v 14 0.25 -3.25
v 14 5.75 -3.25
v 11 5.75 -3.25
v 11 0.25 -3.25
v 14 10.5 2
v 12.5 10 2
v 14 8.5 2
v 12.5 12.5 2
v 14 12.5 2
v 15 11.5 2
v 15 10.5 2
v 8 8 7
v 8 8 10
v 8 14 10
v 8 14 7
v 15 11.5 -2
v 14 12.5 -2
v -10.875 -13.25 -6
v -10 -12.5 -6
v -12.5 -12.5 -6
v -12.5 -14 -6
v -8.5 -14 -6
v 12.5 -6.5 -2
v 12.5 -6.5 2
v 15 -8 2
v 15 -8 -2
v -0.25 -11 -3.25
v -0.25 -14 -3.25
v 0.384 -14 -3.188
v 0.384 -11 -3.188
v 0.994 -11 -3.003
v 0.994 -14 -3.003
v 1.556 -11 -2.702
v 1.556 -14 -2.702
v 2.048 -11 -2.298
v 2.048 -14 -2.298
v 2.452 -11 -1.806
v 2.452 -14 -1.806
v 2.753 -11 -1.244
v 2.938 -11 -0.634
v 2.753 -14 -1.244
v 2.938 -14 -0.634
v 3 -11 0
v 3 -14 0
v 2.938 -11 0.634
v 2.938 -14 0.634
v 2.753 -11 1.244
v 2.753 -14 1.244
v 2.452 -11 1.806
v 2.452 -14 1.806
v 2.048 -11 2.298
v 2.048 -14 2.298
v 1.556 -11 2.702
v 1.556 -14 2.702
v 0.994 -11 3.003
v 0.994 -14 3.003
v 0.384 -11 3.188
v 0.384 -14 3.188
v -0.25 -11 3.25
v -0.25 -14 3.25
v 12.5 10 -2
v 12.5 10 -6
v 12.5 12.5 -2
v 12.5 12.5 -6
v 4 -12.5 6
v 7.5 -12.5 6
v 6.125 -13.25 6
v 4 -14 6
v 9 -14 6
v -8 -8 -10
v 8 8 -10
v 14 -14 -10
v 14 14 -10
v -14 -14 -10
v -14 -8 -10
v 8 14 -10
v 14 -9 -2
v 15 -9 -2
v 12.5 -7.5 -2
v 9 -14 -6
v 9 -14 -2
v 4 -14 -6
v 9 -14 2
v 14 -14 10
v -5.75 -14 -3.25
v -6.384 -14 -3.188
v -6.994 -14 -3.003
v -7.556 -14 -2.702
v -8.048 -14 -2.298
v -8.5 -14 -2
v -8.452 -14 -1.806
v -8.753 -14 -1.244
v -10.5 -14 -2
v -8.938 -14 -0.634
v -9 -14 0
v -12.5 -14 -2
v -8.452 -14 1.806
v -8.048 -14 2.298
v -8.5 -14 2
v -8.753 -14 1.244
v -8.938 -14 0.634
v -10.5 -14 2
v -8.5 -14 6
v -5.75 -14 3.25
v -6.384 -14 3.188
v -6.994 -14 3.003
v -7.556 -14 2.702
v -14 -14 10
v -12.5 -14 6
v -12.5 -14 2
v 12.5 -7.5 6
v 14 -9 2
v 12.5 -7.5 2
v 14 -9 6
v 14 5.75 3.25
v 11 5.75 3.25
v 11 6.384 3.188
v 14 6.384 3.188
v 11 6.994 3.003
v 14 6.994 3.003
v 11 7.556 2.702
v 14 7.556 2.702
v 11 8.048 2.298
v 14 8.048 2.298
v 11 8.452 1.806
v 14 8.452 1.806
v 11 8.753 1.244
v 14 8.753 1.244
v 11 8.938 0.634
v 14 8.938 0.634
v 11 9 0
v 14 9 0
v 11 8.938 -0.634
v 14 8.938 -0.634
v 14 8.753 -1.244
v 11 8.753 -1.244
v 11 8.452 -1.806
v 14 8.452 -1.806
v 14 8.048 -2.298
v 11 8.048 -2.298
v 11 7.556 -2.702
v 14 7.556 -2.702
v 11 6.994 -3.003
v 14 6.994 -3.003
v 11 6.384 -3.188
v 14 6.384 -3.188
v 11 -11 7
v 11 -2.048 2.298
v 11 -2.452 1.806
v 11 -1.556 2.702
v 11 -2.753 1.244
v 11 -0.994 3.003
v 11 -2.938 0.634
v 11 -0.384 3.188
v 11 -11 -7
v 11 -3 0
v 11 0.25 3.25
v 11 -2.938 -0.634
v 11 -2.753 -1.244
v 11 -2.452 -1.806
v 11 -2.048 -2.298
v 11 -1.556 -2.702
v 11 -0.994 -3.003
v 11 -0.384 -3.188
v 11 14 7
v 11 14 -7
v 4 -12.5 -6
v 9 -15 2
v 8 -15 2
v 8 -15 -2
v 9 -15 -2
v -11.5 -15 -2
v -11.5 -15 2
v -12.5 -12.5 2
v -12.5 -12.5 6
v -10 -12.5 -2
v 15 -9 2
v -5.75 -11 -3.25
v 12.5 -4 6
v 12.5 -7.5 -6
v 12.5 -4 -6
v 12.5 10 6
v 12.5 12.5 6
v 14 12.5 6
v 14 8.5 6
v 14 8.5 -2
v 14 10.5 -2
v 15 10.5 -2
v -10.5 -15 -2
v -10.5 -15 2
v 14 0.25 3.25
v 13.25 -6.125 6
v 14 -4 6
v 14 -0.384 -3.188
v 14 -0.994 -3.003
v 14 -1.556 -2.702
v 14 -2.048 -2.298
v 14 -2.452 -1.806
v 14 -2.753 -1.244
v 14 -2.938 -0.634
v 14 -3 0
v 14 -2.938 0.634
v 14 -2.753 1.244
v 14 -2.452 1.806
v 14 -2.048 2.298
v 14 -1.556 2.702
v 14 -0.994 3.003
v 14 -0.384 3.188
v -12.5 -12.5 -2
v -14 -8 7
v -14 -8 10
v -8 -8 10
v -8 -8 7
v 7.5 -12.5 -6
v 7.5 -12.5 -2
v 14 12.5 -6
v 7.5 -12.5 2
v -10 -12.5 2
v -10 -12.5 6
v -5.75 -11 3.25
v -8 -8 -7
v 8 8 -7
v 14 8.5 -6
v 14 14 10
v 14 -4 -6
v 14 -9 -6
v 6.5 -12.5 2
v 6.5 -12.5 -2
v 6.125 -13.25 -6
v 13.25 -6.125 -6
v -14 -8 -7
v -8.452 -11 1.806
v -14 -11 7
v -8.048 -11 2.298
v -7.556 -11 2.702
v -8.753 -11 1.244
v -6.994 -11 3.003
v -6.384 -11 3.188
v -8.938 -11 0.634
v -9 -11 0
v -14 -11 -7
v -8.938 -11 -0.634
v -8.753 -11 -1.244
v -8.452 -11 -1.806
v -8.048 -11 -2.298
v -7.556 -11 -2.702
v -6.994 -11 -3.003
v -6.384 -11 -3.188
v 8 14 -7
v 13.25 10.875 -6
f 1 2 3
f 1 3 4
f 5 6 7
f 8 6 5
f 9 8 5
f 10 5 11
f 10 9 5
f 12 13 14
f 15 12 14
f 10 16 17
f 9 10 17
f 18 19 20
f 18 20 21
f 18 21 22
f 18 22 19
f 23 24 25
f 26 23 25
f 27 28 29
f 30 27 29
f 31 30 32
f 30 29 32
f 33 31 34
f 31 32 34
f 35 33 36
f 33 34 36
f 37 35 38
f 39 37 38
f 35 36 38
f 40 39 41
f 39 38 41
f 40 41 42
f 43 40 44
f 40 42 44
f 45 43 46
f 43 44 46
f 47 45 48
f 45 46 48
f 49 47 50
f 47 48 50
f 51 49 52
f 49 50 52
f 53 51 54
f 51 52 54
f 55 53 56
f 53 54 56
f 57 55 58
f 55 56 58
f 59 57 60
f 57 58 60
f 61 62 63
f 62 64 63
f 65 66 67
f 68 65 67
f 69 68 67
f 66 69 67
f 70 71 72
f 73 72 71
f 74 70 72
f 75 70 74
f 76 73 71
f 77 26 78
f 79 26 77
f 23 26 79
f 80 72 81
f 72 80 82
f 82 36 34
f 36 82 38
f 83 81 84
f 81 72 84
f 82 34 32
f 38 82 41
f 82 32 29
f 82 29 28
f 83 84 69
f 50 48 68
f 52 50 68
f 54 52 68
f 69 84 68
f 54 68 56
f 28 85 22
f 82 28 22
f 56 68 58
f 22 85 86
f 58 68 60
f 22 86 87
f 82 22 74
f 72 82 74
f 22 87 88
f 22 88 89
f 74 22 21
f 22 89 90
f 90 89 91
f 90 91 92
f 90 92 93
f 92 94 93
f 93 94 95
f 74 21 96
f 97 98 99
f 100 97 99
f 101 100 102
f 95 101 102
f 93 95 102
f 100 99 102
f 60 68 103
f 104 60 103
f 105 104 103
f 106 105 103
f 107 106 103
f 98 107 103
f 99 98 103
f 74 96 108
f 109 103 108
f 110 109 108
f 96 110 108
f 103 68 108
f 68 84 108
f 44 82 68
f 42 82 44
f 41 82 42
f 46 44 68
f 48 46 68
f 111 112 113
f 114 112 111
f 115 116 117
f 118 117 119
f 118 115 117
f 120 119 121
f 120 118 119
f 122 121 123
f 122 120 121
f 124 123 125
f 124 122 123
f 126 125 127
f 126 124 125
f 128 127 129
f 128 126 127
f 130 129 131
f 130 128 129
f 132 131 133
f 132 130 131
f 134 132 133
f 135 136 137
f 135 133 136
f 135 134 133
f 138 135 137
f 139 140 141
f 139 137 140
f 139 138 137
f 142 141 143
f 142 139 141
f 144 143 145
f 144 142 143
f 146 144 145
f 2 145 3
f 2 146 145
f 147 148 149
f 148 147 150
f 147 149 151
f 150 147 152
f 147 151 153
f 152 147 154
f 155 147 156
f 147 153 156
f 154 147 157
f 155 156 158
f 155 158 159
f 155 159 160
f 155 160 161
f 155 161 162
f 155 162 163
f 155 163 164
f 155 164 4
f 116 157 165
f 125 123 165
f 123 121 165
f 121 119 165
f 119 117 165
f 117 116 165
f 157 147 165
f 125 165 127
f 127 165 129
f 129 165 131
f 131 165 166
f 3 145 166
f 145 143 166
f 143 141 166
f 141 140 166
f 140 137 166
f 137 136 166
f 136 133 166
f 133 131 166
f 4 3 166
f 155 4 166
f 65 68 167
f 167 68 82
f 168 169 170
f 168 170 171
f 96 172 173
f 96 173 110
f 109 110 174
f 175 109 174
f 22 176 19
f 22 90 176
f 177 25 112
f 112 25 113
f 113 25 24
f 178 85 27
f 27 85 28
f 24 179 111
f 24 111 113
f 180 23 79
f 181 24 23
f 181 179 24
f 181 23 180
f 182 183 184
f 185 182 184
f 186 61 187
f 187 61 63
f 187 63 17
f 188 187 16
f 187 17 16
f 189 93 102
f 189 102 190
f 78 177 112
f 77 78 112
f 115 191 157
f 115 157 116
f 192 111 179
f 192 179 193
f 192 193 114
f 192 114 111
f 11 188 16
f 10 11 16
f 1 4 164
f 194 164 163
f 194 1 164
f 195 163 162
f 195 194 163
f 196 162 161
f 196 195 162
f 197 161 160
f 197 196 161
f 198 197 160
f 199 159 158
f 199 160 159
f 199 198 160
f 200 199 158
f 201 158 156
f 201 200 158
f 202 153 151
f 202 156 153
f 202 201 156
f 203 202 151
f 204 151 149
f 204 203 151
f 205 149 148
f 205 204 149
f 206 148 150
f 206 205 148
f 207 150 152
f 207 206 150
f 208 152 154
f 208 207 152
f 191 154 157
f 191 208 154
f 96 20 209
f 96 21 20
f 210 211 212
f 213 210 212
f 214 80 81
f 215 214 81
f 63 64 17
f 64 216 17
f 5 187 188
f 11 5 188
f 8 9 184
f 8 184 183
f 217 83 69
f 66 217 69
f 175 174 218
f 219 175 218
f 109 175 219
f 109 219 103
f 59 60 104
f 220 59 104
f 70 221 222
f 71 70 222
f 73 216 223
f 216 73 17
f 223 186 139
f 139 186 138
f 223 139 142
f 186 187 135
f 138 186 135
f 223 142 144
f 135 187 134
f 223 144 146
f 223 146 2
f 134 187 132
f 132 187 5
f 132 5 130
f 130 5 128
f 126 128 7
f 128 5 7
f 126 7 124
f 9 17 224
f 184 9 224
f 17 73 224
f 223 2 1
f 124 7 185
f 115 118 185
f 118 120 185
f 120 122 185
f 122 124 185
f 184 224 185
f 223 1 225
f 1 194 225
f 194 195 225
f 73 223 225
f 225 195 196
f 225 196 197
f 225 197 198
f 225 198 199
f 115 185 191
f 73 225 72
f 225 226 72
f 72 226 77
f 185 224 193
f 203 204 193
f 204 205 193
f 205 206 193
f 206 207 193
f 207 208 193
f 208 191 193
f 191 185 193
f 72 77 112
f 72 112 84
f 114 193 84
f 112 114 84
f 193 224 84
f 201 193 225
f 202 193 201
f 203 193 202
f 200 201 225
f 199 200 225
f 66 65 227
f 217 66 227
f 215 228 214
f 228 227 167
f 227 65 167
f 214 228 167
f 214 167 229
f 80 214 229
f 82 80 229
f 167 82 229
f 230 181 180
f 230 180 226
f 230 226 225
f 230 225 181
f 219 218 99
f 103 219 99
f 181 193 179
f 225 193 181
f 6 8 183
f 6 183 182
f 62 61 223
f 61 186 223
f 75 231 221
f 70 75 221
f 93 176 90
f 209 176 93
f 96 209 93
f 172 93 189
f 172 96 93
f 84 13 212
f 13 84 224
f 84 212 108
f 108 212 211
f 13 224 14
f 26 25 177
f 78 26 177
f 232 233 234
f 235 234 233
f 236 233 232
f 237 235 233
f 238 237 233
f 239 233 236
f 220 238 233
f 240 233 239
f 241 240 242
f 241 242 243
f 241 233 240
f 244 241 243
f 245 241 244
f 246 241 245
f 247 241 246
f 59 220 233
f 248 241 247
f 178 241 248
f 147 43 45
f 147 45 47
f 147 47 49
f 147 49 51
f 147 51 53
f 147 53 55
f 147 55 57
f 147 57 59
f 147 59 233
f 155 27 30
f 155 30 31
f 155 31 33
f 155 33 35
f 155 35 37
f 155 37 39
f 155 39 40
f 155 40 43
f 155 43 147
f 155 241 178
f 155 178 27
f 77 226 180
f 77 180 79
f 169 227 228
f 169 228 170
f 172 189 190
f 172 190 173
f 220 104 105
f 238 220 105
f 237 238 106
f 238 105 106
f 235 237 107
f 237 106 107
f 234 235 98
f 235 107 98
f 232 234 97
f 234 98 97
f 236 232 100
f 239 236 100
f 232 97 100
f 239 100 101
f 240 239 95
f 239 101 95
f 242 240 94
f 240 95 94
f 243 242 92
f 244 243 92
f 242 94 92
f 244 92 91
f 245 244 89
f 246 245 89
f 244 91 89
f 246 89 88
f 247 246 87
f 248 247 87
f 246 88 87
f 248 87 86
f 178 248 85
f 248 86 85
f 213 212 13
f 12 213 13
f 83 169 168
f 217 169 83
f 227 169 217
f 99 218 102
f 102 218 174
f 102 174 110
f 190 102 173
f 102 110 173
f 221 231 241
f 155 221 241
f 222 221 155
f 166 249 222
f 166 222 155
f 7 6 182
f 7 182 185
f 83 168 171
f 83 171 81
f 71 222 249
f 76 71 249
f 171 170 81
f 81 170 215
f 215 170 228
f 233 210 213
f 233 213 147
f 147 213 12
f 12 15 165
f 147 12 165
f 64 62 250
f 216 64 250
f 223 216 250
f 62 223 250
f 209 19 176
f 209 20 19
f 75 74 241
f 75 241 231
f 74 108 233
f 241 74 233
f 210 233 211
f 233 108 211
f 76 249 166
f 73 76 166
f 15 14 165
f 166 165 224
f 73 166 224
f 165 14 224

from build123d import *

# Parameters (mm, degrees)
EXTRUDE_1_DEPTH     = 10
SKETCH_4_W          = 25
SKETCH_4_H          = 14
CUT_EXTRUDE_1_DEPTH = 25
LOFT_START          = 2
LOFT_2_DEPTH        = 4
EXTRUDE_2_DEPTH     = 2
CUT_EXTRUDE_2_DEPTH = 33.86335345
LOFT_START_2        = -2
LOFT_4_DEPTH        = 4


# Read off the part's stored shape, not the designer's step: 切除-放样2, 放样4
with BuildPart() as part:
    # Sketch 1 → 凸台-拉伸1 (new, symmetric)
    with BuildSketch(Plane.XY):
        Polygon((-14, -8), (-8, -8), (8, 8), (8, 14), (14, 14), (14, -14), (-14, -14), align=None)
    extrude(amount=EXTRUDE_1_DEPTH, both=True)

    # 草图4 → 切除-拉伸1 (cut)
    with BuildSketch(Plane(origin=(0, 14, 0), x_dir=(1, 0, 0), z_dir=(0, 1, 0))):
        with Locations((-1.5, 0)):
            Rectangle(SKETCH_4_W, SKETCH_4_H)
    extrude(amount=-CUT_EXTRUDE_1_DEPTH, mode=Mode.SUBTRACT)

    # Sketch 1 2 → 切除-放样1 section 0
    with BuildSketch(Plane(origin=(12.5, 0, 0), x_dir=(0, 0, -1), z_dir=(1, 0, 0))):
        with BuildLine():
            Line((6, 10), (6, 12.5))
            Line((6, 12.5), (2, 12.5))
            Line((2, 12.5), (2, 10))
            Line((2, 10), (6, 10))
        make_face()
    # 草图2<110> → 切除-放样1 section 1
    with BuildSketch(Plane(origin=(14, 0, 0), x_dir=(0, 0, -1), z_dir=(1, 0, 0))):
        with BuildLine():
            Line((2, 8.5), (6, 8.5))
            Line((6, 8.5), (6, 12.5))
            Line((6, 12.5), (2, 12.5))
            Line((2, 12.5), (2, 8.5))
        make_face()
    loft_1 = loft(mode=Mode.SUBTRACT)

    # 切除-放样2 outline → 切除-放样2 (cut)
    with BuildSketch(Plane.XY.offset(LOFT_START)):
        Polygon((12.5, 12.5), (12.5, 10), (14, 8.5), (14, 12.5), align=None)
    loft_2 = extrude(amount=LOFT_2_DEPTH, mode=Mode.SUBTRACT)

    # 基准面1草图<9> → 切除-放样3 section 0
    with BuildSketch(Plane(origin=(12.5, 0, 0), x_dir=(0, 0, -1), z_dir=(1, 0, 0))):
        with BuildLine():
            Line((-6, -4), (6, -4))
            Line((6, -4), (6, -7.5))
            Line((6, -7.5), (-6, -7.5))
            Line((-6, -7.5), (-6, -4))
        make_face()
    # 草图2<114> → 切除-放样3 section 1
    with BuildSketch(Plane(origin=(14, 0, 0), x_dir=(0, 0, -1), z_dir=(1, 0, 0))):
        with BuildLine():
            Line((-6, -4), (6, -4))
            Line((6, -4), (6, -9))
            Line((6, -9), (-6, -9))
            Line((-6, -9), (-6, -4))
        make_face()
    loft_3 = loft(mode=Mode.SUBTRACT)

    # 草图9 → 凸台-拉伸2 (add, symmetric)
    with BuildSketch(Plane.XY):
        Polygon((15, -8), (15, -9), (12.5, -9), (12.5, -6.5), align=None)
    extrude_2 = extrude(amount=EXTRUDE_2_DEPTH, both=True)

    # 草图2<115> → 切除-拉伸2 (cut, through all)
    with BuildSketch(Plane(origin=(14, 0, 0), x_dir=(0, 0, -1), z_dir=(1, 0, 0))):
        with BuildLine():
            Line((-3.25, 0.25), (-3.25, 5.75))
            ThreePointArc((-3.25, 5.75), (0, 9), (3.25, 5.75))
            Line((3.25, 5.75), (3.25, 0.25))
            ThreePointArc((3.25, 0.25), (0, -3), (-3.25, 0.25))
        make_face()
    cut_extrude_2 = extrude(amount=-CUT_EXTRUDE_2_DEPTH, mode=Mode.SUBTRACT)

    # 放样4 outline → 放样4 (add)
    with BuildSketch(Plane.XY.offset(LOFT_START_2)):
        Polygon((14, 10.5), (15, 10.5), (15, 11.5), (14, 12.5), align=None)
    loft_4 = extrude(amount=LOFT_4_DEPTH)

    # 镜向1: 切除-放样1, 切除-放样2, 切除-放样3, 凸台-拉伸2, 切除-拉伸2, 放样4 across plane
    add(loft_1.mirror(Plane(origin=(0, 0, 0), x_dir=(0, 0, 1), z_dir=(0.7071067811865474, 0.7071067811865477, 0))), mode=Mode.SUBTRACT)
    add(loft_2.mirror(Plane(origin=(0, 0, 0), x_dir=(0, 0, 1), z_dir=(0.7071067811865474, 0.7071067811865477, 0))), mode=Mode.SUBTRACT)
    add(loft_3.mirror(Plane(origin=(0, 0, 0), x_dir=(0, 0, 1), z_dir=(0.7071067811865474, 0.7071067811865477, 0))), mode=Mode.SUBTRACT)
    add(extrude_2.mirror(Plane(origin=(0, 0, 0), x_dir=(0, 0, 1), z_dir=(0.7071067811865474, 0.7071067811865477, 0))))
    add(cut_extrude_2.mirror(Plane(origin=(0, 0, 0), x_dir=(0, 0, 1), z_dir=(0.7071067811865474, 0.7071067811865477, 0))), mode=Mode.SUBTRACT)
    add(loft_4.mirror(Plane(origin=(0, 0, 0), x_dir=(0, 0, 1), z_dir=(0.7071067811865474, 0.7071067811865477, 0))))


solid = part.part
